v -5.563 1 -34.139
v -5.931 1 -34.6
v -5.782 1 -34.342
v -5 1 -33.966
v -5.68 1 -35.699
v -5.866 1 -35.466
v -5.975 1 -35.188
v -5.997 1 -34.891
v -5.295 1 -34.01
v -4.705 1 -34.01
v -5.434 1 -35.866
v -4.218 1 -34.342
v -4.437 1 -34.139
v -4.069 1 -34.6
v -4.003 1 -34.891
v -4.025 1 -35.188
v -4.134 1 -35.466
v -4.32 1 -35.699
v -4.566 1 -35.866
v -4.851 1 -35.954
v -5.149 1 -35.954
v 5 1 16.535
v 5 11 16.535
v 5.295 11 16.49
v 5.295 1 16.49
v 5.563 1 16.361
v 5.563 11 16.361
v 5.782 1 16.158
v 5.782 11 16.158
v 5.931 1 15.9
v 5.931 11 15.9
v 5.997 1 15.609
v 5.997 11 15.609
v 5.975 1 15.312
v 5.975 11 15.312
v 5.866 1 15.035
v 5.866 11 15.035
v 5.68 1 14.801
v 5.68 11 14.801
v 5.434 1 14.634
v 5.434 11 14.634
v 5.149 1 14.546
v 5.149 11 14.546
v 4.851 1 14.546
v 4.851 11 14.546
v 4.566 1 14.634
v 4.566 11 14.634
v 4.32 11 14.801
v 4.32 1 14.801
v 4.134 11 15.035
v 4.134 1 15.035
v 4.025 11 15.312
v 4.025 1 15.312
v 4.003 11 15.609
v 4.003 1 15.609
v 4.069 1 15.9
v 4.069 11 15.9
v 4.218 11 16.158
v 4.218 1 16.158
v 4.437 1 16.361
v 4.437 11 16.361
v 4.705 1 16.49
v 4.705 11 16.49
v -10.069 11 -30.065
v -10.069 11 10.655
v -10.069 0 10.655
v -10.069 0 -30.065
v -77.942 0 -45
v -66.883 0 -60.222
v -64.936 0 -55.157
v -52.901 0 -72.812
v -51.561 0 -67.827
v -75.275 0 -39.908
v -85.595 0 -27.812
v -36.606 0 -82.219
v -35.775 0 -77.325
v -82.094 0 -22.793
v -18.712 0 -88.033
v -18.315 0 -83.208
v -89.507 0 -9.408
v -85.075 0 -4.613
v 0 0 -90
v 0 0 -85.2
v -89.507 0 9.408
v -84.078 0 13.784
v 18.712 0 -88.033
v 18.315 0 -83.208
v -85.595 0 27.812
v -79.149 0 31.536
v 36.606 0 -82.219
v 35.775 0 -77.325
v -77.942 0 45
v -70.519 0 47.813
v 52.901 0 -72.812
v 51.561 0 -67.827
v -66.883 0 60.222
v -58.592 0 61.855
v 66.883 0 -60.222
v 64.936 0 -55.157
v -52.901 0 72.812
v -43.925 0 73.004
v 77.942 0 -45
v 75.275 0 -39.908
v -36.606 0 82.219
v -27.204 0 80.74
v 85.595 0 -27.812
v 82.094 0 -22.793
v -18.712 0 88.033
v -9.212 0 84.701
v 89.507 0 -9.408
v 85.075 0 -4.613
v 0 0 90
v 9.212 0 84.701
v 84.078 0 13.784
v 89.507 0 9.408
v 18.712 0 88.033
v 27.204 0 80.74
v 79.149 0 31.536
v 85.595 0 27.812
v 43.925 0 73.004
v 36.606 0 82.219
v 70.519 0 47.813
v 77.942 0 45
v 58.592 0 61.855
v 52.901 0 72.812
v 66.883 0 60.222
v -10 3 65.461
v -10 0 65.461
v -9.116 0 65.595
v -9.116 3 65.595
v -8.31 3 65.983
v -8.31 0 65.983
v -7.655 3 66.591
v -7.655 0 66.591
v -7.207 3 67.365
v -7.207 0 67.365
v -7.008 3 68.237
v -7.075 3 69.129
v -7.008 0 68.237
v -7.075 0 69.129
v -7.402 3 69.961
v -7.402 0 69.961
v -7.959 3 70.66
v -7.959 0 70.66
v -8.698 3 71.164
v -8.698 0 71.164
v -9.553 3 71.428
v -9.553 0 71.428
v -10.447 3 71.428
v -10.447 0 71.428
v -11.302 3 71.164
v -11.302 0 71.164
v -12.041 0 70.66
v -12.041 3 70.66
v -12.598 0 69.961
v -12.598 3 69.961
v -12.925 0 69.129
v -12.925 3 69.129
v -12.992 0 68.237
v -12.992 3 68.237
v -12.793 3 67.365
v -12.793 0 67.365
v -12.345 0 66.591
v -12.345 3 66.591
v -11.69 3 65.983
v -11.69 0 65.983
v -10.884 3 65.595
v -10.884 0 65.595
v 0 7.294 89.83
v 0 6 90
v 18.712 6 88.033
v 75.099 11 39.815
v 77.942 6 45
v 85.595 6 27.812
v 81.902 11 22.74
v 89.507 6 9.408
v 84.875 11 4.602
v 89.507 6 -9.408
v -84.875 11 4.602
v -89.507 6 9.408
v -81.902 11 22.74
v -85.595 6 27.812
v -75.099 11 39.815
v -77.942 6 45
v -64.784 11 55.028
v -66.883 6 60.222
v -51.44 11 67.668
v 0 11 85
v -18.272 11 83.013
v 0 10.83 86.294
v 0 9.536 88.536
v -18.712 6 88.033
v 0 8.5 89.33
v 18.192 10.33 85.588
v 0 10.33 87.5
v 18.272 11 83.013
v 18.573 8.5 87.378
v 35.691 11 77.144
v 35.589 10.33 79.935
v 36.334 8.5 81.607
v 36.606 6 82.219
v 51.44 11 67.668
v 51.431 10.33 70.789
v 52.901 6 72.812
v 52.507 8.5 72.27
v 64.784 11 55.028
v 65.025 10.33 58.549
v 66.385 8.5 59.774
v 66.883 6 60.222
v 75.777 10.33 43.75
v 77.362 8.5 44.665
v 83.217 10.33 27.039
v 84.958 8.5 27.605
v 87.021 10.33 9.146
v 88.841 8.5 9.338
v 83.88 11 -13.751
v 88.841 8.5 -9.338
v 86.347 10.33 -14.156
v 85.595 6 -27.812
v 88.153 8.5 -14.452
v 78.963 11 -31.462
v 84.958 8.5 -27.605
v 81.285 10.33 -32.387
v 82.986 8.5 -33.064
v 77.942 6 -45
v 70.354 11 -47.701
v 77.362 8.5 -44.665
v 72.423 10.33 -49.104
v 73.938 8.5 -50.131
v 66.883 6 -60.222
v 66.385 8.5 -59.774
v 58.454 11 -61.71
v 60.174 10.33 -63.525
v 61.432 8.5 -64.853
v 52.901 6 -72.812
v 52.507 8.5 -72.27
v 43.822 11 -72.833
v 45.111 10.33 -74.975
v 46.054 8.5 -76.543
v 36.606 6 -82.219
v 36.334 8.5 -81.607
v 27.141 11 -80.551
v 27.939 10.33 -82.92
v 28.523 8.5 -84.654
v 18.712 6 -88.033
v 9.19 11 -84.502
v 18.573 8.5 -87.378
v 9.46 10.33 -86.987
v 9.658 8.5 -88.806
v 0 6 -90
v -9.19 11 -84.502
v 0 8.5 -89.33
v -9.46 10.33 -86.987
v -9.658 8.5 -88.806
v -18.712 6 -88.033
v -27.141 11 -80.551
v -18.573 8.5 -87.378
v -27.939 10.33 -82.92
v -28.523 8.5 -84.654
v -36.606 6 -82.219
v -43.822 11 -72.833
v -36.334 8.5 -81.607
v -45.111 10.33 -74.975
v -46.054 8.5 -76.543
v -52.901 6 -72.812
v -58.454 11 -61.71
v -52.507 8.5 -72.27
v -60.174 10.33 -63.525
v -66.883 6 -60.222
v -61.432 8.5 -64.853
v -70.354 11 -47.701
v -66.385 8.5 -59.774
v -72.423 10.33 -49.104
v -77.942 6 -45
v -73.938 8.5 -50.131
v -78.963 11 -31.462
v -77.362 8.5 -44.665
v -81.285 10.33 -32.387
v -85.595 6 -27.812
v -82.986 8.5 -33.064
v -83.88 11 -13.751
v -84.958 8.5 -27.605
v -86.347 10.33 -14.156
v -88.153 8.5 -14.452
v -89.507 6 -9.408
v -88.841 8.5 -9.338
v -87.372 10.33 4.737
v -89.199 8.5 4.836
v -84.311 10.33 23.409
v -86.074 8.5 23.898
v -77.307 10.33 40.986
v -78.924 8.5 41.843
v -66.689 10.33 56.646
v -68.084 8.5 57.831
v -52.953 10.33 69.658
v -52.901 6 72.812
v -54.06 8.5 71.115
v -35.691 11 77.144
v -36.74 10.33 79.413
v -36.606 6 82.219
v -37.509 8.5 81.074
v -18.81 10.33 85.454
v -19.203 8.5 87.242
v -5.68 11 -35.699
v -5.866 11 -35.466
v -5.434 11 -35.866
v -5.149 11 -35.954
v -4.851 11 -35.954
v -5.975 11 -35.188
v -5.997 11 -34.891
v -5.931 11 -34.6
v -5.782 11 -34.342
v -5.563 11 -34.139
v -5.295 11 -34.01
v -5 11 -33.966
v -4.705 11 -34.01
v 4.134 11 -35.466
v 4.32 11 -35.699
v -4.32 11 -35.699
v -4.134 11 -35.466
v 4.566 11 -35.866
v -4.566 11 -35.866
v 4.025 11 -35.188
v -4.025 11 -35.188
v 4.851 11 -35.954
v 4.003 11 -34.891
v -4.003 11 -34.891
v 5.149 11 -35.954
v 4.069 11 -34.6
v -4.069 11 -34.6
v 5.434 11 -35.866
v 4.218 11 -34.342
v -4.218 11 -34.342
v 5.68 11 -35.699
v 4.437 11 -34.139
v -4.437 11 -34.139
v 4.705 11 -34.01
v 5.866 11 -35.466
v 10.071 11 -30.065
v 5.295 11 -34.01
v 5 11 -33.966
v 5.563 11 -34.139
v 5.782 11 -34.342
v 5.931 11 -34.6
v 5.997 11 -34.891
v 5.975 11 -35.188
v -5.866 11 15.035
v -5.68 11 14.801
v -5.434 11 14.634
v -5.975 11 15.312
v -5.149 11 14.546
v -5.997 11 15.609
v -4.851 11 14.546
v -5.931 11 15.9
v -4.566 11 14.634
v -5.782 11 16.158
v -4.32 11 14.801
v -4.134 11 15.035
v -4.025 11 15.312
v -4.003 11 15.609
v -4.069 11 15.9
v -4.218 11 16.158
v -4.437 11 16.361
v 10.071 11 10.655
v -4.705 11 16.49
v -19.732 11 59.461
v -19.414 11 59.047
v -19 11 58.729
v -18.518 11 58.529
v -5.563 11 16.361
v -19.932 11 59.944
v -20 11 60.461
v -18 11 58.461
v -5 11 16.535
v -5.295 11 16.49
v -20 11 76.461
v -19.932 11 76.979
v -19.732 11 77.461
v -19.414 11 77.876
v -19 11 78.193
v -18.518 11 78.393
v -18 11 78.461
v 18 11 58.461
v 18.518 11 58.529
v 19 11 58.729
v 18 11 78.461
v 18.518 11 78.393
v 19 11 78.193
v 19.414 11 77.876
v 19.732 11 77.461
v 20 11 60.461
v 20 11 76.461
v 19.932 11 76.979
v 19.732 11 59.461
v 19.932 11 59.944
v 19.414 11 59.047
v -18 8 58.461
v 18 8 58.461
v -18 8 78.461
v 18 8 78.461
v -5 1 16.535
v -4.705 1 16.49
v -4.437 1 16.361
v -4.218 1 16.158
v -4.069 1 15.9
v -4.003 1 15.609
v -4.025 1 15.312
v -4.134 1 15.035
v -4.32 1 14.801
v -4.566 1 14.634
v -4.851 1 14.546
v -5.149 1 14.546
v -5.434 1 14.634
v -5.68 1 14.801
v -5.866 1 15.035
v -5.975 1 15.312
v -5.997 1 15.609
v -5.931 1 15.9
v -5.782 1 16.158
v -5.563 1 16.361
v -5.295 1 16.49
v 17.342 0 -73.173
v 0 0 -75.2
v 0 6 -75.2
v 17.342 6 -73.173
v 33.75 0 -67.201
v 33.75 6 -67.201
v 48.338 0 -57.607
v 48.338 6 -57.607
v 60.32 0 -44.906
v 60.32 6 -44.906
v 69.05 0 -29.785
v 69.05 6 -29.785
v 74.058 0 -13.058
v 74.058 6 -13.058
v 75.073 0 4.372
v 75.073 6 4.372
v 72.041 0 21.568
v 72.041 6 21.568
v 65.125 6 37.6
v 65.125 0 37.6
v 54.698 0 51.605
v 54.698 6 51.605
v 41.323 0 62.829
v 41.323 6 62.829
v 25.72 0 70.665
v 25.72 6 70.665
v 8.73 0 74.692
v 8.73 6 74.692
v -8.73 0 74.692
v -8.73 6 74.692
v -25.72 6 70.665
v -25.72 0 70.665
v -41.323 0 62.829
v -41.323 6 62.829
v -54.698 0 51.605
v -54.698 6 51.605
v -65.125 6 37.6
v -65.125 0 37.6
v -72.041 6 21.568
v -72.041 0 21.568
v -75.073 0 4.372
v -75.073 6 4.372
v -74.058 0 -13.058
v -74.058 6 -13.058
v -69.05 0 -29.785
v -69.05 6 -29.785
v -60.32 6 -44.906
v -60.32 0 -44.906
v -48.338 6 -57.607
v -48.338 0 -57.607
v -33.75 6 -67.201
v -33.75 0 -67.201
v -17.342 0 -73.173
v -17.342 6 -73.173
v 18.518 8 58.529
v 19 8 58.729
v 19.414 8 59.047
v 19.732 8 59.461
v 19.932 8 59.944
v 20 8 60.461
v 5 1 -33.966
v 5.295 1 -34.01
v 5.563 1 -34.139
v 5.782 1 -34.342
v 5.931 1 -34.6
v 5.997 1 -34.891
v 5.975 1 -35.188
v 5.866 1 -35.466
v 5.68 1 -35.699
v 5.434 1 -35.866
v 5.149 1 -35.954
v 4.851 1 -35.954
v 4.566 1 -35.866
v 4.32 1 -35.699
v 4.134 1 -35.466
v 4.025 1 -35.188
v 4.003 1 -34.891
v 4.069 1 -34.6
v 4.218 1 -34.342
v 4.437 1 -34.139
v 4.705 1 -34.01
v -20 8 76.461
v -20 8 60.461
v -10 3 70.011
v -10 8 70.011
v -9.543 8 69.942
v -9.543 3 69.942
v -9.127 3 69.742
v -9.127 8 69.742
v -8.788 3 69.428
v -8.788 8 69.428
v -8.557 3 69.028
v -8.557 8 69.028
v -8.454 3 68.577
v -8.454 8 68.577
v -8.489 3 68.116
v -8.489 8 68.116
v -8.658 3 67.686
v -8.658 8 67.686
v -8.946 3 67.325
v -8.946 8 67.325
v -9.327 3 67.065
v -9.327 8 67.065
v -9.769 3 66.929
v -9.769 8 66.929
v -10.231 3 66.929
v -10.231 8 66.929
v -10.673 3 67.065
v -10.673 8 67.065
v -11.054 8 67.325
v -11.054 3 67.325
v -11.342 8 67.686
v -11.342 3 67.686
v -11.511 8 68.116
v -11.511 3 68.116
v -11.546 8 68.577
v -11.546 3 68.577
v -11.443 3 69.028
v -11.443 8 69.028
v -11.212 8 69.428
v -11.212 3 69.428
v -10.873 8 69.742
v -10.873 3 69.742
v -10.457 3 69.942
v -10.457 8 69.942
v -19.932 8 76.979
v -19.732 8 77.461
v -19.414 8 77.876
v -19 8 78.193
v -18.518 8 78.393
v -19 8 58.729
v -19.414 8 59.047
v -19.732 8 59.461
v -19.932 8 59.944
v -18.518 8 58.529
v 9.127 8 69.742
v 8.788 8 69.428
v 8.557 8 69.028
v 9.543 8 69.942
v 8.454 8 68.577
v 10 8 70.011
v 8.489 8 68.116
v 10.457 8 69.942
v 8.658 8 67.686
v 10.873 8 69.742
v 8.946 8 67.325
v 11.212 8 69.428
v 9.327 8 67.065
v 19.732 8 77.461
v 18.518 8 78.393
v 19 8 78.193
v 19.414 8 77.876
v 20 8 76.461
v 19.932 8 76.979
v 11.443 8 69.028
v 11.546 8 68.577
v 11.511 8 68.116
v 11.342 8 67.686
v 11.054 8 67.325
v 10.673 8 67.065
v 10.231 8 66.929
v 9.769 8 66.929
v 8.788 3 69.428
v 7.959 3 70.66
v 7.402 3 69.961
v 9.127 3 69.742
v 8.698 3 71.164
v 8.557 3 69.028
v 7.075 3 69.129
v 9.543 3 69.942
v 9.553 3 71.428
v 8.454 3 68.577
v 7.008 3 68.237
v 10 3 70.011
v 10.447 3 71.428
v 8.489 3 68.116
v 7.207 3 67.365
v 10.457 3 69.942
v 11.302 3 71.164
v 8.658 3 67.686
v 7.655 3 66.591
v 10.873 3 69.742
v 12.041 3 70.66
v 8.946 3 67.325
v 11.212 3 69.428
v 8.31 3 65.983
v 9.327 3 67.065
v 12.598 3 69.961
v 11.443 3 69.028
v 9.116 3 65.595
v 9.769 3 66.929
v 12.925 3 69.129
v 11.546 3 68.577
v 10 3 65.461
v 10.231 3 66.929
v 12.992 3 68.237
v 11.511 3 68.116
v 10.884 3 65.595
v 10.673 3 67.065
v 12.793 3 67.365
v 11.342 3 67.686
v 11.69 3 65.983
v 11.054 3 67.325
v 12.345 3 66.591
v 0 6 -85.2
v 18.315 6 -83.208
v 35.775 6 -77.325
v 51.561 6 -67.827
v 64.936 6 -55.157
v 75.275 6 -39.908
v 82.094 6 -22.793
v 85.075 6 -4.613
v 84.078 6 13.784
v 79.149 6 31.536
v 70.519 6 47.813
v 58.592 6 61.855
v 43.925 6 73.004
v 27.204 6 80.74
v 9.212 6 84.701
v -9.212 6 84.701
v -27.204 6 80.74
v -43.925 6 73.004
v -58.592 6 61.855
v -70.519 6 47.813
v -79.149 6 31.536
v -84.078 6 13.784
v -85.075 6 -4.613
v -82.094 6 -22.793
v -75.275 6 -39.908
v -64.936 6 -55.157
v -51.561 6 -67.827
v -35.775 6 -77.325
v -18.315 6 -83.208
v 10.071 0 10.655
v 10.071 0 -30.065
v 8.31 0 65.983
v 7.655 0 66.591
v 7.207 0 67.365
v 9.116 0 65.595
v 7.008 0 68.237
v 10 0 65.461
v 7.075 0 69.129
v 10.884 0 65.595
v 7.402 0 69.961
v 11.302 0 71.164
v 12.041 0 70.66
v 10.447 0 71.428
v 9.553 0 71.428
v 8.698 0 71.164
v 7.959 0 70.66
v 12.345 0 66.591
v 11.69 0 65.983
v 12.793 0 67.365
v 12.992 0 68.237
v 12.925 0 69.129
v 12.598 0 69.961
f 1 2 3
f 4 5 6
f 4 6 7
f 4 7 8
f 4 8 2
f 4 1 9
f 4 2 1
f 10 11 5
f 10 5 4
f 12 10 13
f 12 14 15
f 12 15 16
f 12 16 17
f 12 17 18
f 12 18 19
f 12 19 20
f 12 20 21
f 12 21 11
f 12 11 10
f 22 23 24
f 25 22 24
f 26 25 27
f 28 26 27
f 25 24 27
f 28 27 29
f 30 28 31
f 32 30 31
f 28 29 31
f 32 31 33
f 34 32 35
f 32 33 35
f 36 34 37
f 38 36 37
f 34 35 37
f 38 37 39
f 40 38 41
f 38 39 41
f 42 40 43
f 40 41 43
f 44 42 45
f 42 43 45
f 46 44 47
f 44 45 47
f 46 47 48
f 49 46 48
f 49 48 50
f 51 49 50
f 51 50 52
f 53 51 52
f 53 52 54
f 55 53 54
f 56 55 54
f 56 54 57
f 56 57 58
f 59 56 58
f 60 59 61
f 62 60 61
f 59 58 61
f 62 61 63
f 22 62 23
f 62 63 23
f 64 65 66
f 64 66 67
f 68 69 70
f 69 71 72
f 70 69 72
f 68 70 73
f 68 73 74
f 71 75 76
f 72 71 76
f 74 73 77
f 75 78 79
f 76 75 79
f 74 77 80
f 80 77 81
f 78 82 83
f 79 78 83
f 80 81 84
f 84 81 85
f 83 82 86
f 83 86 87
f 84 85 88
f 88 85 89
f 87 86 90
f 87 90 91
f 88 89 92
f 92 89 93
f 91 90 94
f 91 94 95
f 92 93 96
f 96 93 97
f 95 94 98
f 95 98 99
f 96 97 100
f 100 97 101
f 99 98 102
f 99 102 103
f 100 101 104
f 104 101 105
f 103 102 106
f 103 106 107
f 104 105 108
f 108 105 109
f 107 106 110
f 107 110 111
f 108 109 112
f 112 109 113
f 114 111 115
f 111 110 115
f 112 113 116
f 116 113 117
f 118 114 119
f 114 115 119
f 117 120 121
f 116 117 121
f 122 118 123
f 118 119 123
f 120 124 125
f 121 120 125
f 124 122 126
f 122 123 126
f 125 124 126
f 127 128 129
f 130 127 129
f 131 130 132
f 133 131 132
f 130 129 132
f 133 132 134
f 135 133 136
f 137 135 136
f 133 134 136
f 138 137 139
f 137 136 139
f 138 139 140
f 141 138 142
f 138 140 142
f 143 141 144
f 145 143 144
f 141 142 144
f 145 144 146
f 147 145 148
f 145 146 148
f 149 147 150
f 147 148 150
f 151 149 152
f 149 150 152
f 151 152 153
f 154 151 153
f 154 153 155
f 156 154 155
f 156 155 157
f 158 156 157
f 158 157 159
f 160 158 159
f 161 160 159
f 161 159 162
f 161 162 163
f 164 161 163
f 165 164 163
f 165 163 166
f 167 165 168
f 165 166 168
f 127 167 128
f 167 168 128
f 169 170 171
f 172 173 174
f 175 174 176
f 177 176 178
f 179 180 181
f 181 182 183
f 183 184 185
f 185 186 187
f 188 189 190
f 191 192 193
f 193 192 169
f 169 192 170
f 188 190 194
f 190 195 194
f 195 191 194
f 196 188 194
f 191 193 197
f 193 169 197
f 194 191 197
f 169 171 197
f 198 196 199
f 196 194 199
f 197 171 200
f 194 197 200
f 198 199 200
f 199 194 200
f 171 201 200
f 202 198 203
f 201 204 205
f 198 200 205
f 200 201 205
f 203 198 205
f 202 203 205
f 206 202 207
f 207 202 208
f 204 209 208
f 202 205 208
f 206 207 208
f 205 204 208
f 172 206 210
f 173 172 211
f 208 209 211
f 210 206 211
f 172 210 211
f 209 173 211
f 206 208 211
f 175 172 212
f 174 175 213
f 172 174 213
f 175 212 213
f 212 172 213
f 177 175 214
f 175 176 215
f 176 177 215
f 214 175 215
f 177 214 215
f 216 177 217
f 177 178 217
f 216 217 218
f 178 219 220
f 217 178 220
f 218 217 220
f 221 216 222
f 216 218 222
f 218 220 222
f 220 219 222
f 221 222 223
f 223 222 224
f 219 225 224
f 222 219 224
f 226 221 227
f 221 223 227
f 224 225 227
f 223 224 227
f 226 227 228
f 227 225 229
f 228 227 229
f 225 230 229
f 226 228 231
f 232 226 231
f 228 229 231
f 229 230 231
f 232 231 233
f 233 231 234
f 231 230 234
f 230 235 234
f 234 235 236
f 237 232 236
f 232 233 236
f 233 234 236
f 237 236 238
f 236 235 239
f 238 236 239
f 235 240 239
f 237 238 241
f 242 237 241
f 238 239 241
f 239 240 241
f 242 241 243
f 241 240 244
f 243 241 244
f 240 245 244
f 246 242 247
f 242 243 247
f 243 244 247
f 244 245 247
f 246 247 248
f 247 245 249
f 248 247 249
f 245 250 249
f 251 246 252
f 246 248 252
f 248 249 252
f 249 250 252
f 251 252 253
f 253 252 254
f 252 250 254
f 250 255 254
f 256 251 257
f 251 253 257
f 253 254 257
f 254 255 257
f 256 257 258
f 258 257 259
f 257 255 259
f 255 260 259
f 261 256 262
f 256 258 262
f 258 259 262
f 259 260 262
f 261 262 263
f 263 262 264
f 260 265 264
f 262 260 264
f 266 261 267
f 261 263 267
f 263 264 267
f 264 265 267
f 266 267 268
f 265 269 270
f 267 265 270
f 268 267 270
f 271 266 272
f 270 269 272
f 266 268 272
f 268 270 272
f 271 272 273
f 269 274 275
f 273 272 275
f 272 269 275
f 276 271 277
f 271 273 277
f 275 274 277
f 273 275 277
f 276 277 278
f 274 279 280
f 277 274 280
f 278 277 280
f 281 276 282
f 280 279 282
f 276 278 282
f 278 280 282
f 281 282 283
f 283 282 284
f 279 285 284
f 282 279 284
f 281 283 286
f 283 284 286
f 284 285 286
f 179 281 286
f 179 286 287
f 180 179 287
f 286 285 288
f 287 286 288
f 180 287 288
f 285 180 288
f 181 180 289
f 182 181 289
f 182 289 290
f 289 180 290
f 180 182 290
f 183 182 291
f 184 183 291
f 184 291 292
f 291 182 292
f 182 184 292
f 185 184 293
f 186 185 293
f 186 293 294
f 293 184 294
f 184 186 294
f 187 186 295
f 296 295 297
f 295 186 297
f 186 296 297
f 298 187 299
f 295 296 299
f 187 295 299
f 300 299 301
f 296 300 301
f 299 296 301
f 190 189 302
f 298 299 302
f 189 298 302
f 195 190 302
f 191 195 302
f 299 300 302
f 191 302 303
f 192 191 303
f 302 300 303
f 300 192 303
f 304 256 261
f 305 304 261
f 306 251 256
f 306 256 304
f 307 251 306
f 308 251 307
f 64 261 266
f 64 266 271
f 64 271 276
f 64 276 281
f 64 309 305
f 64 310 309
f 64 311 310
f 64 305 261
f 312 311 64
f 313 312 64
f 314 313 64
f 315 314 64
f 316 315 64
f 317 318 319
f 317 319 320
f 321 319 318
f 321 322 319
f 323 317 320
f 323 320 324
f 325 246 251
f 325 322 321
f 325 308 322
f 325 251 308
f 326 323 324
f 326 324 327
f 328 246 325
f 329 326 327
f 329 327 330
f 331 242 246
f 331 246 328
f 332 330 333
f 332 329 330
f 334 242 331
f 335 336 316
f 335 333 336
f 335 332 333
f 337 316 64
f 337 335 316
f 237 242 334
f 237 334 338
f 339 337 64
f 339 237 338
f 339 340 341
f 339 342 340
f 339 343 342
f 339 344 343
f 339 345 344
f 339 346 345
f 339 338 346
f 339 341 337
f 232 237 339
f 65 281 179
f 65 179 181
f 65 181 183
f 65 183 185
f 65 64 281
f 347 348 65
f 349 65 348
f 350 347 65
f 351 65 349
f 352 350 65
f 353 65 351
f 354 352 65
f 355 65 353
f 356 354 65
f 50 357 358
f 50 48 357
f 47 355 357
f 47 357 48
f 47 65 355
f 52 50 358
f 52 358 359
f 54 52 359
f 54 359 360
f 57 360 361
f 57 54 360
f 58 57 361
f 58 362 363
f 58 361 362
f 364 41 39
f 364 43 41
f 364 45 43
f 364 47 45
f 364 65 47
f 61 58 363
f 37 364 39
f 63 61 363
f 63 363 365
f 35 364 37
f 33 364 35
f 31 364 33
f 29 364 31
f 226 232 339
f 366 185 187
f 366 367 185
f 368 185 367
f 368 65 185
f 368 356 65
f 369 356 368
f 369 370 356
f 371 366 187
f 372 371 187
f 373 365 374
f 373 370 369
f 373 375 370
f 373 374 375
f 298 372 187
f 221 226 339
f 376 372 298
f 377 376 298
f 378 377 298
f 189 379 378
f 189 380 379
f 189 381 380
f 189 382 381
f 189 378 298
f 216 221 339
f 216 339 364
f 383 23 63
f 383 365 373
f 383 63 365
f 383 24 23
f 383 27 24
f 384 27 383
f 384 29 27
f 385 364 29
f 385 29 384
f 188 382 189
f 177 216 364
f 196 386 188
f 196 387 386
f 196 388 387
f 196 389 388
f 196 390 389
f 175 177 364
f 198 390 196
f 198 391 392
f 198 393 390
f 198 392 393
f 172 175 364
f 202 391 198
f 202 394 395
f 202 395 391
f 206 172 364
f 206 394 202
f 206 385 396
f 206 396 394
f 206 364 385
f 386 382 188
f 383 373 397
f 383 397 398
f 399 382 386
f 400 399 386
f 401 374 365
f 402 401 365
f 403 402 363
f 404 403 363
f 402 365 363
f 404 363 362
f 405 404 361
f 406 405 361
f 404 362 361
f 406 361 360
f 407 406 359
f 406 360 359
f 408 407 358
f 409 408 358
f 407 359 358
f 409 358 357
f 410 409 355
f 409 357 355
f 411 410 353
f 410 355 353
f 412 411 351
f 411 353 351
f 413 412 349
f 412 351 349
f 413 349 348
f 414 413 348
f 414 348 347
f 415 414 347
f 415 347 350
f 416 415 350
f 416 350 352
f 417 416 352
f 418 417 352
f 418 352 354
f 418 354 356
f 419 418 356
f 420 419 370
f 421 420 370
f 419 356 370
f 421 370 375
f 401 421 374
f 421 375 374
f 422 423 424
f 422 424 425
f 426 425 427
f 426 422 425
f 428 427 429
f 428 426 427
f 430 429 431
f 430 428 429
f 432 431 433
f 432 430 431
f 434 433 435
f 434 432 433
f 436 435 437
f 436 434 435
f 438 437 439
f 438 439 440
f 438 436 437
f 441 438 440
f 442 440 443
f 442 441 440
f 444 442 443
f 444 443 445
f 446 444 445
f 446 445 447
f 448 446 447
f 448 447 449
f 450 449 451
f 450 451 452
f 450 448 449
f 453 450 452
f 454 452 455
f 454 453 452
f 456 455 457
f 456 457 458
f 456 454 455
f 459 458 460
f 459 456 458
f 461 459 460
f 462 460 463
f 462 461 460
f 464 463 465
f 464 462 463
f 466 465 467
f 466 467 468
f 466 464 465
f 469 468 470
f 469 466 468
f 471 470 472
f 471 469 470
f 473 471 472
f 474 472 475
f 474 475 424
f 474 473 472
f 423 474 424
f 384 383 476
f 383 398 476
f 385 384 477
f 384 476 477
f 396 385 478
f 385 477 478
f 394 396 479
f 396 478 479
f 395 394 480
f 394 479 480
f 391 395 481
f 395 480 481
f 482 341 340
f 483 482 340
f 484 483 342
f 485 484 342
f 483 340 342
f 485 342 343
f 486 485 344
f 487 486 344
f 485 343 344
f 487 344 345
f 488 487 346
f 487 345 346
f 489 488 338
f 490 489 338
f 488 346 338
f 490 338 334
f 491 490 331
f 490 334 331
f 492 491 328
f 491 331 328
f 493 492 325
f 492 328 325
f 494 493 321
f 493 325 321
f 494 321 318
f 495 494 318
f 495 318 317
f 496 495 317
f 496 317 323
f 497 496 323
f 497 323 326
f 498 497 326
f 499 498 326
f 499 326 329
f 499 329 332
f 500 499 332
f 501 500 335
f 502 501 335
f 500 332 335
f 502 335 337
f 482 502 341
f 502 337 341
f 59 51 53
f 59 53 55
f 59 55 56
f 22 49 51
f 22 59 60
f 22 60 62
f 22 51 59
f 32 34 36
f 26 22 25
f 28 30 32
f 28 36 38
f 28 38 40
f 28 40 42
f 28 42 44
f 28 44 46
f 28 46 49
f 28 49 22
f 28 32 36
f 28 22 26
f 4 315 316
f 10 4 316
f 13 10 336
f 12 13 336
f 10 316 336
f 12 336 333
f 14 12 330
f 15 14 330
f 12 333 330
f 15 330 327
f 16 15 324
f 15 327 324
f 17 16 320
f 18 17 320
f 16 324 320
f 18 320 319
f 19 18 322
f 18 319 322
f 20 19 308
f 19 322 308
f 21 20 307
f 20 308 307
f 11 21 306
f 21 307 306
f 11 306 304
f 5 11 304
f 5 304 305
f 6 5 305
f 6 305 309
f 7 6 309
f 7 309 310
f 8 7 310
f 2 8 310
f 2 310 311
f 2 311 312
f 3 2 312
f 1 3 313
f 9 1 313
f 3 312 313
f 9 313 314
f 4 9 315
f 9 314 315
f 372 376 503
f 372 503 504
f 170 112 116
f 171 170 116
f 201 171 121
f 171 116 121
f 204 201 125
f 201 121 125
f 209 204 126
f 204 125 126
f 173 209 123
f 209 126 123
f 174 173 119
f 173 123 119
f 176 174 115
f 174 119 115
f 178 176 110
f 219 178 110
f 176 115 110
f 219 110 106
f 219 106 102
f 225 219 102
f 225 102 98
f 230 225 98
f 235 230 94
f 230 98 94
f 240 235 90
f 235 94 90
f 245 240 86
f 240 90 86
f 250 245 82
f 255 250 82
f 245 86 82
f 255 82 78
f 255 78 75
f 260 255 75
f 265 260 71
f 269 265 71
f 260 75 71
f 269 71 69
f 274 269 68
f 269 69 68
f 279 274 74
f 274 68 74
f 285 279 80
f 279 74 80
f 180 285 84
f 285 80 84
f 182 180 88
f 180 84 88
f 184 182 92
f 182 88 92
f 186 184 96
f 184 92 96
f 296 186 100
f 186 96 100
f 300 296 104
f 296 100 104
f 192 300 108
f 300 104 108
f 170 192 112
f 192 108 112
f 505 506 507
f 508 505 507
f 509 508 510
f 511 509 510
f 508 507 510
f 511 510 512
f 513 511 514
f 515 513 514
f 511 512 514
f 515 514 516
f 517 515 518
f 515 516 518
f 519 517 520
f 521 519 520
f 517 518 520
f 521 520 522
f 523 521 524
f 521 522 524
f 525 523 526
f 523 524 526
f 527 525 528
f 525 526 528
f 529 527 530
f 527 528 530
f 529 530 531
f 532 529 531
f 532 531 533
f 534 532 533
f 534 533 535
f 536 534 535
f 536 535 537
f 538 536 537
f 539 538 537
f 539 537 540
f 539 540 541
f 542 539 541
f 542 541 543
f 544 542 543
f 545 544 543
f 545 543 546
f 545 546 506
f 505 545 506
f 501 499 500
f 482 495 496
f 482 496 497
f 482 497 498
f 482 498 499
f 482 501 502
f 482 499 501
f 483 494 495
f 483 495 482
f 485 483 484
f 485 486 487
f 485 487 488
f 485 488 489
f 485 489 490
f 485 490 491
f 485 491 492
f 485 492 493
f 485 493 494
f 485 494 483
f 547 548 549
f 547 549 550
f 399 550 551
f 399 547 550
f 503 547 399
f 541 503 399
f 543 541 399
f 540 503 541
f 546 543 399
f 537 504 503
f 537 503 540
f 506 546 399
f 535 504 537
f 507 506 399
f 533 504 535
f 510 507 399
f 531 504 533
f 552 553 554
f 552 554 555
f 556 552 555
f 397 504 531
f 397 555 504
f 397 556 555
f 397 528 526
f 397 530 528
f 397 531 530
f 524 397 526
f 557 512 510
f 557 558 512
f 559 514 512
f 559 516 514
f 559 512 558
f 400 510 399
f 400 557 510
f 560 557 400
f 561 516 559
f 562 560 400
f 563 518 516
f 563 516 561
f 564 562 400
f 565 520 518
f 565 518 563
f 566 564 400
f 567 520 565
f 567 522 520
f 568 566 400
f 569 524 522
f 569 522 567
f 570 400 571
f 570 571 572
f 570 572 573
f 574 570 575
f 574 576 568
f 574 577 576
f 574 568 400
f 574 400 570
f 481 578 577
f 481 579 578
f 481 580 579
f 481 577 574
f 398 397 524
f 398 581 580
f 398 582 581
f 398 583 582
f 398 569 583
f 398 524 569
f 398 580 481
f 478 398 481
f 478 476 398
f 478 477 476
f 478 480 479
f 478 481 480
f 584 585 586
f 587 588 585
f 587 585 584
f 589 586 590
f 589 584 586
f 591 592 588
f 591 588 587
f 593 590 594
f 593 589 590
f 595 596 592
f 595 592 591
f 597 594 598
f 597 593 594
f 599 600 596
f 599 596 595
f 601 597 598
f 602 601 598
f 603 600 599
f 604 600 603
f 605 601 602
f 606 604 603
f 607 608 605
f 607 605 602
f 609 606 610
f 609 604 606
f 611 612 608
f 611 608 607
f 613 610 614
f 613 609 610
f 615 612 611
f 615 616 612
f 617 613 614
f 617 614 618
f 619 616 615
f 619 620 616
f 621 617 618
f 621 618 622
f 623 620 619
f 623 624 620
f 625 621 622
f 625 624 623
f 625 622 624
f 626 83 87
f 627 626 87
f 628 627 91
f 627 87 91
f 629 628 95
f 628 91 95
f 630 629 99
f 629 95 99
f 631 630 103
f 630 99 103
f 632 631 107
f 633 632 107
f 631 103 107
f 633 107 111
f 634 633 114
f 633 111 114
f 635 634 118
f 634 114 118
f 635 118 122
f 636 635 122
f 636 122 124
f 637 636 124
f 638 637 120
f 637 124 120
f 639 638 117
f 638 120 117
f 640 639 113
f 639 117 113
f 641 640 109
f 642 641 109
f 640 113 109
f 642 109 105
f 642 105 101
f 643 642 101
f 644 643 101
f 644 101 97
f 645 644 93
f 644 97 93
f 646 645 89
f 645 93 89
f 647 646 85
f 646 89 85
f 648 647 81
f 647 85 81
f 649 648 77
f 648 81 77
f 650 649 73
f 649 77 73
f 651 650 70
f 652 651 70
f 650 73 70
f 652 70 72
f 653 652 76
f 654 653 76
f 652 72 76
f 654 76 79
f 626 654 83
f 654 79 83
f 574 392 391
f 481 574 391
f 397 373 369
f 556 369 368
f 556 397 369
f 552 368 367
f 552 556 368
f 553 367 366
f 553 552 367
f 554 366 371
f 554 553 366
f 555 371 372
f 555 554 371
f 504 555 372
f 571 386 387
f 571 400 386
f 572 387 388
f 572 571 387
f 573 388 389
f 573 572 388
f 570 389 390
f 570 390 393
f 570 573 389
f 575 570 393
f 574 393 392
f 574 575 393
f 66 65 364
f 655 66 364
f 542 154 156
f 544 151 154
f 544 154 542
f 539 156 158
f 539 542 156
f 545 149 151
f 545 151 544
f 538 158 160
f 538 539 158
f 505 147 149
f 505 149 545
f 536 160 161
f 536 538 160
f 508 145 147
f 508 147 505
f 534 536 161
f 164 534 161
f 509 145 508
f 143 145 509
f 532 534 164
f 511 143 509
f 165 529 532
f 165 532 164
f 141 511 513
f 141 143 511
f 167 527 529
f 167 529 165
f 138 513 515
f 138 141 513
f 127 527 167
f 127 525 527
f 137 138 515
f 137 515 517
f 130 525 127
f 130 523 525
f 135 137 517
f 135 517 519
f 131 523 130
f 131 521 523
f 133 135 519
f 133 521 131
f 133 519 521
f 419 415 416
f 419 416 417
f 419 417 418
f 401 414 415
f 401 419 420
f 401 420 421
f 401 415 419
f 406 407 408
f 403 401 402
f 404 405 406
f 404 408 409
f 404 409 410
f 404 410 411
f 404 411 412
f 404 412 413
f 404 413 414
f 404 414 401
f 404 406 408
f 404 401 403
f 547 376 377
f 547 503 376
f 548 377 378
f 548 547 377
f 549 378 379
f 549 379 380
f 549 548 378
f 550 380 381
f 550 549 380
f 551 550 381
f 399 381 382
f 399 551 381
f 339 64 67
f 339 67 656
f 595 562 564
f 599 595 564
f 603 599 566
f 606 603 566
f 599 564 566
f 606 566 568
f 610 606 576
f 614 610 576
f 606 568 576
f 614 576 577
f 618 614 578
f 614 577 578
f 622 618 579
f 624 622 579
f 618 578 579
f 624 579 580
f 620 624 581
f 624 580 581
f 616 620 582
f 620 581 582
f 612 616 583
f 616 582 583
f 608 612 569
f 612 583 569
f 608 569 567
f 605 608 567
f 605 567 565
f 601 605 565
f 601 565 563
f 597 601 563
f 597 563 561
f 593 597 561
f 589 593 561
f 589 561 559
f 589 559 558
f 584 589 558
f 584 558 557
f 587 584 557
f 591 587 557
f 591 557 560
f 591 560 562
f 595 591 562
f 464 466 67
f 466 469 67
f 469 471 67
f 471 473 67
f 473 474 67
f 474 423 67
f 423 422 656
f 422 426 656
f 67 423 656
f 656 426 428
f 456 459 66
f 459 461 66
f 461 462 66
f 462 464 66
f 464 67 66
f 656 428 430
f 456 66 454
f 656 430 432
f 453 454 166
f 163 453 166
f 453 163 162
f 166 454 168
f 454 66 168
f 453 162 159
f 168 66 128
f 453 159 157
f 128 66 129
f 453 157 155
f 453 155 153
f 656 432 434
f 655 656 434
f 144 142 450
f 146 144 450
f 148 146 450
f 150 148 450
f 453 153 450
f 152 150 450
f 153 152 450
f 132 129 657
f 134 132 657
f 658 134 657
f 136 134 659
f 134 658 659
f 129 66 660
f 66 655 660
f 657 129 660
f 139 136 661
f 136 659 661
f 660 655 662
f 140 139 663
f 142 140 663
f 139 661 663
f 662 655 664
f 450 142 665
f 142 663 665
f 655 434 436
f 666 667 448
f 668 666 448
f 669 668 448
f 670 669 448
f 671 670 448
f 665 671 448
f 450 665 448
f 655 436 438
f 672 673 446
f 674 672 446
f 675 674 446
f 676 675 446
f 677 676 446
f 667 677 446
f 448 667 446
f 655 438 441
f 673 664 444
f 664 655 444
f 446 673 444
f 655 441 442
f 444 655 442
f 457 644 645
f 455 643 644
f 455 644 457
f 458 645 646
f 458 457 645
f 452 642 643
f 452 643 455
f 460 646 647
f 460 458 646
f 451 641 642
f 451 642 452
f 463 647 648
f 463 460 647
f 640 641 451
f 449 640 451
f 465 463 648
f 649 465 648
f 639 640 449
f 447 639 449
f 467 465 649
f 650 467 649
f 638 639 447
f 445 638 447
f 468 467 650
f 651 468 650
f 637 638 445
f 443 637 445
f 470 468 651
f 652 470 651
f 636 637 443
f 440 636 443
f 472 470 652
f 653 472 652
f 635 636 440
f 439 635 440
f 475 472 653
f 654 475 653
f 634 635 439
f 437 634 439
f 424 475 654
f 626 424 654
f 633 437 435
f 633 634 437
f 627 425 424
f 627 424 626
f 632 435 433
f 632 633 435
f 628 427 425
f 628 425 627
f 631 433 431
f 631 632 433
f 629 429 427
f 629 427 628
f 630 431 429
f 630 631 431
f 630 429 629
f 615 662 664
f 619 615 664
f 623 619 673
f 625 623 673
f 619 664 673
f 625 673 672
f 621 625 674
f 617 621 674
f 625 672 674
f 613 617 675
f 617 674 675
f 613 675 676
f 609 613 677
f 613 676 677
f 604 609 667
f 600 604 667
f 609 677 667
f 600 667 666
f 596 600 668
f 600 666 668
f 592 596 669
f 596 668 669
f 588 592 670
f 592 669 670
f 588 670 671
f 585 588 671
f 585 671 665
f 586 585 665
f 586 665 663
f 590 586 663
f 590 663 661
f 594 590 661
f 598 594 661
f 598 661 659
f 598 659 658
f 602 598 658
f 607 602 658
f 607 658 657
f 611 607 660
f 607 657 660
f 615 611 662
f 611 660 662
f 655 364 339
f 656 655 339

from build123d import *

# Parameters (mm, degrees)
SKETCH1_R           = 90
BOSS_EXTRUDE1_DEPTH = 11
SKETCH7_W           = 40
SKETCH7_H           = 20
CUT_EXTRUDE7_DEPTH  = 3
SKETCH12_R          = 1.55
CUT_EXTRUDE8_DEPTH  = 20
SKETCH13_R          = 3
CUT_EXTRUDE9_DEPTH  = 3
FILLET1_R           = 2
FILLET2_R           = 2
FILLET3_R           = 2
FILLET4_R           = 2
SKETCH15_R          = 85.2
SKETCH15_R_2        = 75.2
CUT_EXTRUDE10_DEPTH = 6
FILLET5_R           = 5
SKETCH16_W          = 20.139846291
SKETCH16_H          = 40.720332108
CUT_EXTRUDE13_DEPTH = 20
SKETCH17_R          = 1
CUT_EXTRUDE14_DEPTH = 10


with BuildPart() as part:
    # Sketch1 → Boss-Extrude1 (new body)
    with BuildSketch(Plane(origin=(0, 0, 0), x_dir=(1, 0, 0), z_dir=(0, 1, 0))):
        with Locations(Location((0, 0, 0), (0, 0, 270))):
            Circle(SKETCH1_R)
    extrude(amount=BOSS_EXTRUDE1_DEPTH)

    # Sketch7 → Cut-Extrude7 (cut)
    with BuildSketch(Plane(origin=(0, 11, 0), x_dir=(1, 0, 0), z_dir=(0, 1, 0))):
        with Locations((0, -68.46128741)):
            Rectangle(SKETCH7_W, SKETCH7_H)
    extrude(amount=-CUT_EXTRUDE7_DEPTH, mode=Mode.SUBTRACT)

    # Sketch12 → Cut-Extrude8 (cut)
    with BuildSketch(Plane(origin=(0, 8, 0), x_dir=(1, 0, 0), z_dir=(0, 1, 0))):
        with Locations(Location((10, -68.46128741, 0), (0, 0, 270))):
            Circle(SKETCH12_R)
        with Locations(Location((-10, -68.46128741, 0), (0, 0, 270))):
            Circle(SKETCH12_R)
    extrude(amount=-CUT_EXTRUDE8_DEPTH, mode=Mode.SUBTRACT)

    # Sketch13 → Cut-Extrude9 (cut)
    with BuildSketch(Plane.XZ):
        with Locations(Location((10, 68.46128741, 0), (0, 0, 270))):
            Circle(SKETCH13_R)
        with Locations(Location((-10, 68.46128741, 0), (0, 0, 270))):
            Circle(SKETCH13_R)
    extrude(amount=-CUT_EXTRUDE9_DEPTH, mode=Mode.SUBTRACT)

    # Fillet1
    fillet1_edges = [part.edges().sort_by_distance(p)[0] for p in [
        (-20, 9.5, 58.46128741),
    ]]
    fillet(fillet1_edges, radius=FILLET1_R)

    # Fillet2
    fillet2_edges = [part.edges().sort_by_distance(p)[0] for p in [
        (20, 9.5, 58.46128741),
    ]]
    fillet(fillet2_edges, radius=FILLET2_R)

    # Fillet3
    fillet3_edges = [part.edges().sort_by_distance(p)[0] for p in [
        (-20, 9.5, 78.46128741),
    ]]
    fillet(fillet3_edges, radius=FILLET3_R)

    # Fillet4
    fillet4_edges = [part.edges().sort_by_distance(p)[0] for p in [
        (20, 9.5, 78.46128741),
    ]]
    fillet(fillet4_edges, radius=FILLET4_R)

    # Sketch15 → Cut-Extrude10 (cut)
    with BuildSketch(Plane.XZ):
        with Locations(Location((0, 0, 0), (0, 0, 270))):
            Circle(SKETCH15_R)
        with Locations(Location((0, 0, 0), (0, 0, 270))):
            Circle(SKETCH15_R_2, mode=Mode.SUBTRACT)
    extrude(amount=-CUT_EXTRUDE10_DEPTH, mode=Mode.SUBTRACT)

    # Fillet5
    fillet5_edges = [part.edges().sort_by_distance(p)[0] for p in [
        (0, 11, -90),
    ]]
    fillet(fillet5_edges, radius=FILLET5_R)

    # Sketch16 → Cut-Extrude13 (cut)
    with BuildSketch(Plane(origin=(0, 11, 0), x_dir=(1, 0, 0), z_dir=(0, 1, 0))):
        with Locations((0.000598288, 9.704977579)):
            Rectangle(SKETCH16_W, SKETCH16_H)
    extrude(amount=-CUT_EXTRUDE13_DEPTH, mode=Mode.SUBTRACT)

    # Sketch17 → Cut-Extrude14 (cut)
    with BuildSketch(Plane(origin=(0, 11, 0), x_dir=(1, 0, 0), z_dir=(0, 1, 0))):
        with Locations(Location((-5, 34.9655003, 0), (0, 0, 270))):
            Circle(SKETCH17_R)
        with Locations(Location((5, 34.9655003, 0), (0, 0, 270))):
            Circle(SKETCH17_R)
        with Locations(Location((-5, -15.5345003, 0), (0, 0, 270))):
            Circle(SKETCH17_R)
        with Locations(Location((5, -15.5345003, 0), (0, 0, 270))):
            Circle(SKETCH17_R)
    extrude(amount=-CUT_EXTRUDE14_DEPTH, mode=Mode.SUBTRACT)


solid = part.part
